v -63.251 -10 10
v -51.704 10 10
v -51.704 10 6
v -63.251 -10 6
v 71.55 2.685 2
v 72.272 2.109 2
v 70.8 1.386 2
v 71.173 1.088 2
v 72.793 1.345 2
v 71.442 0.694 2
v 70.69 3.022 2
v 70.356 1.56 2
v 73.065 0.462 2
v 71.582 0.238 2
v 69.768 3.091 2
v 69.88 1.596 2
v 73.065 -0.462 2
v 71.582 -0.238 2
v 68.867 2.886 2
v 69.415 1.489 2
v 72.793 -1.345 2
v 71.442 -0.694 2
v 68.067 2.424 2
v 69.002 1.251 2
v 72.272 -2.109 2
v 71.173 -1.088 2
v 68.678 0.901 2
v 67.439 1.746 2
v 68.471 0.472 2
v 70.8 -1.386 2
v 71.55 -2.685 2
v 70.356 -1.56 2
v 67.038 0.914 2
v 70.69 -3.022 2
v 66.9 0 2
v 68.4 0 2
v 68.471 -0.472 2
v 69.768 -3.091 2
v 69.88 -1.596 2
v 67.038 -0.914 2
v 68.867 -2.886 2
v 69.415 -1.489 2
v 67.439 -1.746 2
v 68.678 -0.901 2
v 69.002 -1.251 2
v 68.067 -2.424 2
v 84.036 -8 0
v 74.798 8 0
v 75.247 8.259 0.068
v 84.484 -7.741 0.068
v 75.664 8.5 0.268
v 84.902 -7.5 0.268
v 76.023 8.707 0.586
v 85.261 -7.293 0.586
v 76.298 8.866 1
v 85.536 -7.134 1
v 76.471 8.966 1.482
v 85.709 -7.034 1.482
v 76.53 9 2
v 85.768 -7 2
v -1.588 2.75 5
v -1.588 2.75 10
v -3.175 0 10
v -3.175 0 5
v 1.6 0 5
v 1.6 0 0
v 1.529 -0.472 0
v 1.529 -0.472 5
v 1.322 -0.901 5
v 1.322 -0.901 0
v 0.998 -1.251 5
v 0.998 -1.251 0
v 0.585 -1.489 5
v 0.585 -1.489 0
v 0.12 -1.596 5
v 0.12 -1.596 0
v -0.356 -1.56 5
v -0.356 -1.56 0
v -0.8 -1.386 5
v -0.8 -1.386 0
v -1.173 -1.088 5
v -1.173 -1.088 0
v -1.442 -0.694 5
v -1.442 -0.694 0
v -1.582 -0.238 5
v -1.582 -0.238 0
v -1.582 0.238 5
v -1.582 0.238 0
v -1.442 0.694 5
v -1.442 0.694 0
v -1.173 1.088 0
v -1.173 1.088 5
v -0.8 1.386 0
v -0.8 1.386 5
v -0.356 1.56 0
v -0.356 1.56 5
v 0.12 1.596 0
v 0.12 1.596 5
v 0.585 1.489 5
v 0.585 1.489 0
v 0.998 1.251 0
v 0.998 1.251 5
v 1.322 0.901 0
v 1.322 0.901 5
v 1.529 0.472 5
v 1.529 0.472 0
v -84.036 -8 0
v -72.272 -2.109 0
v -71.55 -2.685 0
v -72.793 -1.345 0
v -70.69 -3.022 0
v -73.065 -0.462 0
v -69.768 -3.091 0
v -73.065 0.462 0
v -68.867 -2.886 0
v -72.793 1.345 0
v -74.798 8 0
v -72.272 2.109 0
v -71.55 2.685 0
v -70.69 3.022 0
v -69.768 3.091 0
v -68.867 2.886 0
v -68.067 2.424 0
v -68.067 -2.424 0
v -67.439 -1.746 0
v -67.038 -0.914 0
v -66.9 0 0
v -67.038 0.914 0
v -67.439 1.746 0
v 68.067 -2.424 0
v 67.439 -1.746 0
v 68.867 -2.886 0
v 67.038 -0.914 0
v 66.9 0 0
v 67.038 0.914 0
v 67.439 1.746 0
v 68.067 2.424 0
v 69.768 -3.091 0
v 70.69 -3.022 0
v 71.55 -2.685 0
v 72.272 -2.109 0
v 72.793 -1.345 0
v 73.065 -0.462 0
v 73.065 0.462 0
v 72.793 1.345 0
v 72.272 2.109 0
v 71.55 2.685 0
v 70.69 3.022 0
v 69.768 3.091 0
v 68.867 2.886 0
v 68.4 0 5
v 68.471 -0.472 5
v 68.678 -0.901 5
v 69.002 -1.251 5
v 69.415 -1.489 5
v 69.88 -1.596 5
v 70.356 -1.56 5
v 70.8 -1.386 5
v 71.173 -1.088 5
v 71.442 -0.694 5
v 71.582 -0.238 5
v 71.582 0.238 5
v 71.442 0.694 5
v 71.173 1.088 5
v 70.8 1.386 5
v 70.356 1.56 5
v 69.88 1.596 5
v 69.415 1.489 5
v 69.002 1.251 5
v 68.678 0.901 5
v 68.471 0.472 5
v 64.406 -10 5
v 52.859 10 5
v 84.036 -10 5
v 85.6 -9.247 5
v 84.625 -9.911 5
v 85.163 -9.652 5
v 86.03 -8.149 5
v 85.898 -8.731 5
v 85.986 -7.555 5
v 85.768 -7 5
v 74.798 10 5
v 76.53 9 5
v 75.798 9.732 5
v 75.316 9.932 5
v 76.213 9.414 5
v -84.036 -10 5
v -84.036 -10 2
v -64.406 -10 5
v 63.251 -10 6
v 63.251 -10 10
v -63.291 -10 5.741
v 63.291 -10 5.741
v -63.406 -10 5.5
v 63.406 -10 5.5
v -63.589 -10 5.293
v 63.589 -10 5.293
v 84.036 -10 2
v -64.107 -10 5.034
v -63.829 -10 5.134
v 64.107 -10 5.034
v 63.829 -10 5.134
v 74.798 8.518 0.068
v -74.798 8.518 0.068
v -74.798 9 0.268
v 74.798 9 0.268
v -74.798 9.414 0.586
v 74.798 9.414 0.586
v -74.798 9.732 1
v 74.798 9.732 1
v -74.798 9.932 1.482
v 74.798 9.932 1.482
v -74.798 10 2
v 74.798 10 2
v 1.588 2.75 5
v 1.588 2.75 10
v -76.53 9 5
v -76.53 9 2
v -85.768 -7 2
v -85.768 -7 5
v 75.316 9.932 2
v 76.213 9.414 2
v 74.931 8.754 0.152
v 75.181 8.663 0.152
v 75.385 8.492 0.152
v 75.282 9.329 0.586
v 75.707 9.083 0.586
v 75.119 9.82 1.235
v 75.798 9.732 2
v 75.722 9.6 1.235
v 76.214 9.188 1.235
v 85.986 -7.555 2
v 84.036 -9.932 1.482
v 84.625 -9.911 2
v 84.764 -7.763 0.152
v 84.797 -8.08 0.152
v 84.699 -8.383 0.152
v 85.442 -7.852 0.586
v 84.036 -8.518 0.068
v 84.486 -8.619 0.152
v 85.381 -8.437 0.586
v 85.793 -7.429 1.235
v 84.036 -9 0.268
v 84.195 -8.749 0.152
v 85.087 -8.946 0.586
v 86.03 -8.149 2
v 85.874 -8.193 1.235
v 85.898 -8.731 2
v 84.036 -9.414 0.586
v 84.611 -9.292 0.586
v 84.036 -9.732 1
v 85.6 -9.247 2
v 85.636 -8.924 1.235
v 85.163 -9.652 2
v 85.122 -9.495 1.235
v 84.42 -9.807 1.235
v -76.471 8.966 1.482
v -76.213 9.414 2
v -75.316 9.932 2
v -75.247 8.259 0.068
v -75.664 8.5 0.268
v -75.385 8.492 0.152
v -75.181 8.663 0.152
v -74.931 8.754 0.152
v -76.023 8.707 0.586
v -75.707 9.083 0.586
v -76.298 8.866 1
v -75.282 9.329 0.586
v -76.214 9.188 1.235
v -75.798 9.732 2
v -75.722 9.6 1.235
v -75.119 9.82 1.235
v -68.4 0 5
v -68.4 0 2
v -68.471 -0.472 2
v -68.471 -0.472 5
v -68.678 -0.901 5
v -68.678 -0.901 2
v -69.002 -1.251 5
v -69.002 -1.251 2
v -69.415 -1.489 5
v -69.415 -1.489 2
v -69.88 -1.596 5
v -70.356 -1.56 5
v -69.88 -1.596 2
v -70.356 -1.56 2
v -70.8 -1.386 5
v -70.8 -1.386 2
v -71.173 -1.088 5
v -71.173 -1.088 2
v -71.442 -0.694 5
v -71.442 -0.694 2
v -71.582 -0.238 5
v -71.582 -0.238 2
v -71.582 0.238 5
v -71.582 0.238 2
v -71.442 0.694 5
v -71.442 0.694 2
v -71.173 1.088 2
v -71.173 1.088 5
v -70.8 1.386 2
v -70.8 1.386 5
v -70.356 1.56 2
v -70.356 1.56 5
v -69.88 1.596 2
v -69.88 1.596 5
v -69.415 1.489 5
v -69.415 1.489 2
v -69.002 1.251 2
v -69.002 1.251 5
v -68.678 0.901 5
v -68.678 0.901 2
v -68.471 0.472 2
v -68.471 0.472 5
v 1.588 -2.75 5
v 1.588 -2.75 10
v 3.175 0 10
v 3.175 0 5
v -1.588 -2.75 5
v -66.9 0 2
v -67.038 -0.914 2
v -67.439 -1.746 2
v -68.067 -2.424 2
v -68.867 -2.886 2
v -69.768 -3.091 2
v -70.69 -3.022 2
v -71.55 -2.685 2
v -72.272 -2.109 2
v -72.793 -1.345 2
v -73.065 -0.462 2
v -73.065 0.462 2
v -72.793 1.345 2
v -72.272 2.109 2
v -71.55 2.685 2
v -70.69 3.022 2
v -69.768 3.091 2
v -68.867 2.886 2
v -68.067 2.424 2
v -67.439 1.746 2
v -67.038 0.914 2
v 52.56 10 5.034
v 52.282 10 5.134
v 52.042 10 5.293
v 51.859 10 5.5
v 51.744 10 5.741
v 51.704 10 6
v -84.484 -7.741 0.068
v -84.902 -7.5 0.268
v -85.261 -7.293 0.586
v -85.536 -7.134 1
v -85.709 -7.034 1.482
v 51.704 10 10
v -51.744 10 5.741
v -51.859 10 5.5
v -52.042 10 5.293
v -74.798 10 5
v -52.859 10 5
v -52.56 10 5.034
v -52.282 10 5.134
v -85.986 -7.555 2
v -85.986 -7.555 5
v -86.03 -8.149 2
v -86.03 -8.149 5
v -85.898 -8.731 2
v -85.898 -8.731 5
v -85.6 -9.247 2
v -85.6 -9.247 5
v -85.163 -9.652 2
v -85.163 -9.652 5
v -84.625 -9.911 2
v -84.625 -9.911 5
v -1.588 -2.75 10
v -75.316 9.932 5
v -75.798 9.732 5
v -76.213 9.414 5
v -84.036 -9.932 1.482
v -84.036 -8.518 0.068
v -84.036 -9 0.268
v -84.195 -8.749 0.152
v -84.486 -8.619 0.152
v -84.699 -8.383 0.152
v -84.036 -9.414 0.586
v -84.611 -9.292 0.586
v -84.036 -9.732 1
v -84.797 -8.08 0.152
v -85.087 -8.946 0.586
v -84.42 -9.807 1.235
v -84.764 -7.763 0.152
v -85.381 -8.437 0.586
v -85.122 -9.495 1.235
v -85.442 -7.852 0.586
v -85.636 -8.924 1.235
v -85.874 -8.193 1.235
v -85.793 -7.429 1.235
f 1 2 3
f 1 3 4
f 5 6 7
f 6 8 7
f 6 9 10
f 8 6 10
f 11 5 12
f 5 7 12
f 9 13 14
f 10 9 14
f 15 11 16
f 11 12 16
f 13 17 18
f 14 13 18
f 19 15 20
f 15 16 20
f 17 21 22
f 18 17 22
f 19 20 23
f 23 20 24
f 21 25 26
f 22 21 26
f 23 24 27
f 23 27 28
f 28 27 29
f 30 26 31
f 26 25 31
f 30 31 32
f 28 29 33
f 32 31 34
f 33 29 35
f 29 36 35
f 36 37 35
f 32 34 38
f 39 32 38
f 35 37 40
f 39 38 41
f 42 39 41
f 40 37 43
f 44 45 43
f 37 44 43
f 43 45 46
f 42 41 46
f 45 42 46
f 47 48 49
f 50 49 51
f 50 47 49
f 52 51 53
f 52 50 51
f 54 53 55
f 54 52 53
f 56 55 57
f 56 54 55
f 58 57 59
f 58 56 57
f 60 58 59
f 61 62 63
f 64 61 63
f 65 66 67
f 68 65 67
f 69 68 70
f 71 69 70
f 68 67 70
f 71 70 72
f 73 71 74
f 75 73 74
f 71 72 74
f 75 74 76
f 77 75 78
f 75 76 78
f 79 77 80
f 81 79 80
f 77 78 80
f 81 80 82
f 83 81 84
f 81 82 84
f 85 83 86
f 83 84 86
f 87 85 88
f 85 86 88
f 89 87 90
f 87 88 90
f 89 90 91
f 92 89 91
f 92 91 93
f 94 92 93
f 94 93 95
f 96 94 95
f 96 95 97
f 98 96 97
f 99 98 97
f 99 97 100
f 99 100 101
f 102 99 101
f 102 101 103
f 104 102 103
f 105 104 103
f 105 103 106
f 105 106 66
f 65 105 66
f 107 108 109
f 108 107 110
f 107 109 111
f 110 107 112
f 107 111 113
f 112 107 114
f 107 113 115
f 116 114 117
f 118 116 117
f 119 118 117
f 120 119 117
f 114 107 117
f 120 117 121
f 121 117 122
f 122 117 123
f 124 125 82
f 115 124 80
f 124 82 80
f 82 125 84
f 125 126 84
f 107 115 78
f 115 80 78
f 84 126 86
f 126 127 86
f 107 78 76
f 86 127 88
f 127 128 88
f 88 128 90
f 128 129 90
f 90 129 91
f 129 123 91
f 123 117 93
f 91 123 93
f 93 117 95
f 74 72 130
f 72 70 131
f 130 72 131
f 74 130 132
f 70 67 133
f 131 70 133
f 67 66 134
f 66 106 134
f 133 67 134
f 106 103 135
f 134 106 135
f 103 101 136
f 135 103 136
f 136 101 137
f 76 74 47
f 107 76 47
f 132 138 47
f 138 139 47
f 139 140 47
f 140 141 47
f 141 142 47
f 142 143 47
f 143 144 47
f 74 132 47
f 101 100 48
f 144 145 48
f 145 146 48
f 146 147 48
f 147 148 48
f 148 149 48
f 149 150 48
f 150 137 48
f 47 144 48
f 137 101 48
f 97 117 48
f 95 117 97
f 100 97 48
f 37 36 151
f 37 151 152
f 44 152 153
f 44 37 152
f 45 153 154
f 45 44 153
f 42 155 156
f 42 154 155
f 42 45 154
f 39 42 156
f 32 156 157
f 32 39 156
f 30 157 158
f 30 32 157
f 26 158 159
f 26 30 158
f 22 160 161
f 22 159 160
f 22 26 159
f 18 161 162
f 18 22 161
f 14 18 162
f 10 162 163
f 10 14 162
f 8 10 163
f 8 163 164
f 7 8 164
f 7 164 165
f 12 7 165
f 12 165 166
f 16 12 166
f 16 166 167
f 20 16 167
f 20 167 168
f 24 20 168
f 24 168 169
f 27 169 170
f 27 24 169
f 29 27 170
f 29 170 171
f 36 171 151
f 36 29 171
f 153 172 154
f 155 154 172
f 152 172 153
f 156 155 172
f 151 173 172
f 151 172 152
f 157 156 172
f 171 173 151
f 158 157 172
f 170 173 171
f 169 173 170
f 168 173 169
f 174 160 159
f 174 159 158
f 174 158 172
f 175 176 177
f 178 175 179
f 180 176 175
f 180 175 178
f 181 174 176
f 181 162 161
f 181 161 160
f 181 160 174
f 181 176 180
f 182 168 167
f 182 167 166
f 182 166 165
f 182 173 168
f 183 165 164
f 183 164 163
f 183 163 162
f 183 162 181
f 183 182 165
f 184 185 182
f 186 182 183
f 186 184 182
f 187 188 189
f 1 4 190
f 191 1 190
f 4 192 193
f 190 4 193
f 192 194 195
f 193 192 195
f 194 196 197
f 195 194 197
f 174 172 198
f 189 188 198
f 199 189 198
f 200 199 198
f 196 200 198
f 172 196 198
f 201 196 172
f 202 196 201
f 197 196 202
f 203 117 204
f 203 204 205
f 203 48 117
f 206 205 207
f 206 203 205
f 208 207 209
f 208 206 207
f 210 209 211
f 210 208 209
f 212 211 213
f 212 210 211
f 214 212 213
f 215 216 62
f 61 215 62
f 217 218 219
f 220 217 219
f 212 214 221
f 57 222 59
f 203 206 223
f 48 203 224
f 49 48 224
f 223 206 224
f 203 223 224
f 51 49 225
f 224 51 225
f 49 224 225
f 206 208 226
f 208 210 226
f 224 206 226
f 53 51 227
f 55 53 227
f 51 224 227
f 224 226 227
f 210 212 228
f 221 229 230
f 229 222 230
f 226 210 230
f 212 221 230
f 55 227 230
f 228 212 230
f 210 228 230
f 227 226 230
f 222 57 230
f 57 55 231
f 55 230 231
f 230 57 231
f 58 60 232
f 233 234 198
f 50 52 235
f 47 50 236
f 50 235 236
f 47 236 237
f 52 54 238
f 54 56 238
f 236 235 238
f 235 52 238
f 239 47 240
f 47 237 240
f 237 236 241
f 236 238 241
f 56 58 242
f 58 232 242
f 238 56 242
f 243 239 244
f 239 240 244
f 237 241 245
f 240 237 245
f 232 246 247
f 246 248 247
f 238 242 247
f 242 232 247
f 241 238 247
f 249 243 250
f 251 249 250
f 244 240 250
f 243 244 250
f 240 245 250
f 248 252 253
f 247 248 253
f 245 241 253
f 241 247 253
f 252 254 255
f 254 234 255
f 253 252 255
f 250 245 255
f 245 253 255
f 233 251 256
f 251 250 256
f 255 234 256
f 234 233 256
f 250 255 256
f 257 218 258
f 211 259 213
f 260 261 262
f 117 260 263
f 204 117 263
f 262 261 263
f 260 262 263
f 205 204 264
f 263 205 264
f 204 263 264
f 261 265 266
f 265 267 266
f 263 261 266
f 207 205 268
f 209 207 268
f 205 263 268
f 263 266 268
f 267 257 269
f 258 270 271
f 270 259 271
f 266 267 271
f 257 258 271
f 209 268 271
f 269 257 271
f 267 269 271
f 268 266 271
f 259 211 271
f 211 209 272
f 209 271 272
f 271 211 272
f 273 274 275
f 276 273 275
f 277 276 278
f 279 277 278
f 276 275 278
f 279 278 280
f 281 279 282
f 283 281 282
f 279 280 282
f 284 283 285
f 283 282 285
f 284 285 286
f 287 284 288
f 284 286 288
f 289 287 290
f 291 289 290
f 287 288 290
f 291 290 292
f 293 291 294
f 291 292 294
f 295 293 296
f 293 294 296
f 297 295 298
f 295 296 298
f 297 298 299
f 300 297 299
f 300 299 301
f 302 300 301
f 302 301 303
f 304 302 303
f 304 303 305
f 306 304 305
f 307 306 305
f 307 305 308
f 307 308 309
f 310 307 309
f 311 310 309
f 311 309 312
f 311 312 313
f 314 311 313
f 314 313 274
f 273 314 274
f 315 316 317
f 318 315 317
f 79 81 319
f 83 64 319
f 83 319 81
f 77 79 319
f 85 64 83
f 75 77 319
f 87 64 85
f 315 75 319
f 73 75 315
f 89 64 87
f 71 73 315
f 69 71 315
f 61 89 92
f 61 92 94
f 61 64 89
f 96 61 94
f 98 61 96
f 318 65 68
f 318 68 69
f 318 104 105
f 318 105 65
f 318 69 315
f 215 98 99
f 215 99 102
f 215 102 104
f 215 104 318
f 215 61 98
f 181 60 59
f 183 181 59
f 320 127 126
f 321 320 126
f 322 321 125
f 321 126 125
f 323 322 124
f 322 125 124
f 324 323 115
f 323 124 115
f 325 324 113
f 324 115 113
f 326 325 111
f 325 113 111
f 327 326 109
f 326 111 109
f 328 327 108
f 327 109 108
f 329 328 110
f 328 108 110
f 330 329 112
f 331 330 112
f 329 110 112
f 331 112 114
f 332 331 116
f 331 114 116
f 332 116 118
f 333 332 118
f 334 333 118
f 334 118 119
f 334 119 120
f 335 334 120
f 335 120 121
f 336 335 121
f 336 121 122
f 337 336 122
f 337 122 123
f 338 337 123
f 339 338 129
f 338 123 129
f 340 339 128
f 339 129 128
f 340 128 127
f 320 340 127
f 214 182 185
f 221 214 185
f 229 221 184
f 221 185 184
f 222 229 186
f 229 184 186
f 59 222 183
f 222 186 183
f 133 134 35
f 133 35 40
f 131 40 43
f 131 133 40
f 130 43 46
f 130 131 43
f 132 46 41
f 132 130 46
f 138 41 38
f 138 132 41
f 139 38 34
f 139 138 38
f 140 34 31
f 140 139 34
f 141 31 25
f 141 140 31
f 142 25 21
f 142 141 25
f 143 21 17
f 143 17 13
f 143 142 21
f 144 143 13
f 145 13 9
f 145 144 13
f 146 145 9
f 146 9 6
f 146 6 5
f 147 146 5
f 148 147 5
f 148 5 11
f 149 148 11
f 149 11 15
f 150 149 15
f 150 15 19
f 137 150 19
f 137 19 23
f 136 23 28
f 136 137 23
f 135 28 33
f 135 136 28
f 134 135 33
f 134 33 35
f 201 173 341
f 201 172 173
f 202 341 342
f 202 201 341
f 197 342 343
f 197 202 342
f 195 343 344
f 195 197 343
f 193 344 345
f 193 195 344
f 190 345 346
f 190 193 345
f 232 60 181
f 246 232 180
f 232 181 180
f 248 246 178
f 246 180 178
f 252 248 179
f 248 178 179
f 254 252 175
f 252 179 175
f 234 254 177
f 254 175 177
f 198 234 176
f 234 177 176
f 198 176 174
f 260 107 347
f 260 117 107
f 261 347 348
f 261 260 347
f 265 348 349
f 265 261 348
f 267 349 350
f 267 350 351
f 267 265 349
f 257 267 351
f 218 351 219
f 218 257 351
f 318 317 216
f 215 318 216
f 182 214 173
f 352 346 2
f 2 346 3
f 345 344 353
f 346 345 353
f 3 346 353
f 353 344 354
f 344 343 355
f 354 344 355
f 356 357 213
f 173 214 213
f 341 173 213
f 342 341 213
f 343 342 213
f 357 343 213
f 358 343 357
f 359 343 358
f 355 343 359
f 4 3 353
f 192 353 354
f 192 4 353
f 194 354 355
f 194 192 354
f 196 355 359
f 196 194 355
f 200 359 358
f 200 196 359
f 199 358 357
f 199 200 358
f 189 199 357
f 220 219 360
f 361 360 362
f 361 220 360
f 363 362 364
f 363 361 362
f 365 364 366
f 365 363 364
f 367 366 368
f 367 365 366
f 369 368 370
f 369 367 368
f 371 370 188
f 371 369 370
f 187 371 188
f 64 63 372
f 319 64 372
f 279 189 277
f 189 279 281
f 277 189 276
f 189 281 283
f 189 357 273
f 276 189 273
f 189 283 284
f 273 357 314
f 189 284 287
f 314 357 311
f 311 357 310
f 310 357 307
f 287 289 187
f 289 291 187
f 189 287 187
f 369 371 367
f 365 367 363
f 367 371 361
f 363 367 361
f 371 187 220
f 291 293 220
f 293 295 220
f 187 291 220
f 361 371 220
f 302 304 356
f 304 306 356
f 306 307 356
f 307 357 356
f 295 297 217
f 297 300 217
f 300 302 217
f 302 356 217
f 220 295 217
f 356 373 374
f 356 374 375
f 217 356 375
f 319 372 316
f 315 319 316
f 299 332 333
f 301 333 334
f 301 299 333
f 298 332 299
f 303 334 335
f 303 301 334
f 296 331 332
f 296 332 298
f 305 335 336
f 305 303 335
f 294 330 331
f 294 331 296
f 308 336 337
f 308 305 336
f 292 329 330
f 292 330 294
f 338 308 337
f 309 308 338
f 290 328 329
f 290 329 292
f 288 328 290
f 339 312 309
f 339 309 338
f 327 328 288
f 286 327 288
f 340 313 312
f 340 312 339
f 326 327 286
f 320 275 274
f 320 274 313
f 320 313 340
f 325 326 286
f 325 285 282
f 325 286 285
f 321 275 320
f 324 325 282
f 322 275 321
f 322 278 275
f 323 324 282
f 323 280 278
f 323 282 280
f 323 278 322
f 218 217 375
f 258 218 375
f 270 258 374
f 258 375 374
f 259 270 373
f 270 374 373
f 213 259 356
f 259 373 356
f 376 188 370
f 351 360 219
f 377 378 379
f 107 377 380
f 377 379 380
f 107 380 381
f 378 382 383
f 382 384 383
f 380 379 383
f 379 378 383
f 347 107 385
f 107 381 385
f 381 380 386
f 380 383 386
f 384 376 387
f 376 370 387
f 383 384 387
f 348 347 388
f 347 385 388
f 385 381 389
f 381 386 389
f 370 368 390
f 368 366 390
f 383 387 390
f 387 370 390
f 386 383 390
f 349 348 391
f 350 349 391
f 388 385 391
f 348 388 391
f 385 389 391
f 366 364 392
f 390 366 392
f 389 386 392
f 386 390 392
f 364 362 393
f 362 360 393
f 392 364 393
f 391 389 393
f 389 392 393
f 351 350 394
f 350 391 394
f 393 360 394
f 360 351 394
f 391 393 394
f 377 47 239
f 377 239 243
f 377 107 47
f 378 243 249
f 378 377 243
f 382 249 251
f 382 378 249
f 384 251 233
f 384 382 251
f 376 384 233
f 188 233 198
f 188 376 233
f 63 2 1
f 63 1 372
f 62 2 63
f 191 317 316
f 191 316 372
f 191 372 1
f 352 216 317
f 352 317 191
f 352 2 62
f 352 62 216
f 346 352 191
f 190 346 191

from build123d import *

# Parameters (mm, degrees)
PAD_DEPTH       = 10
POCKET_DEPTH    = 5
SKETCH002_R     = 1.6
POCKET001_DEPTH = 10.001
SKETCH003_R     = 1.6
POCKET002_DEPTH = 362.846575
POCKET003_DEPTH = 5
SKETCH005_R     = 3.1
POCKET004_DEPTH = 2
FILLET_R        = 2
FILLET001_R     = 2
FILLET002_R     = 2
FILLET003_R     = 2
FILLET004_R     = 2
FILLET005_R     = 1
FILLET006_R     = 1


with BuildPart() as part:
    # Sketch → Pad (new body)
    with BuildSketch(Plane.XY):
        Polygon((-75.952995, 10), (-87.5, -10), (87.5, -10), (75.952995, 10), align=None)
    extrude(amount=PAD_DEPTH)

    # Sketch001 → Pocket (cut)
    with BuildSketch(Plane.XY.offset(10)):
        Polygon((-75.952995, 10), (-51.704283, 10), (-63.251289, -10), (-87.5, -10), align=None)
    pocket = extrude(amount=-POCKET_DEPTH, mode=Mode.SUBTRACT)

    # Mirrored: Pocket across Sketch001 V_Axis
    add(pocket.mirror(Plane(origin=(0, 0, 10), x_dir=(0, 0, 1), z_dir=(1, 0, 0))), mode=Mode.SUBTRACT)

    # Sketch002 → Pocket001 (cut, through all)
    with BuildSketch(Plane(origin=(0, 0, 0), x_dir=(1, 0, 0), z_dir=(0, 0, -1))):
        Circle(SKETCH002_R)
    extrude(amount=-POCKET001_DEPTH, mode=Mode.SUBTRACT)

    # Sketch003 → Pocket002 (cut, through all)
    with BuildSketch(Plane(origin=(0, 0, 0), x_dir=(1, 0, 0), z_dir=(0, 0, -1))):
        with Locations((-70, 0)):
            Circle(SKETCH003_R)
    pocket002 = extrude(amount=-POCKET002_DEPTH, mode=Mode.SUBTRACT)

    # Mirrored001: Pocket002 across Sketch003 V_Axis
    add(pocket002.mirror(Plane(origin=(0, 0, 0), x_dir=(0, 0, -1), z_dir=(1, 0, 0))), mode=Mode.SUBTRACT)

    # Sketch004 → Pocket003 (cut)
    with BuildSketch(Plane.XY.offset(10)):
        Polygon((3.175426, 0), (1.587713, 2.75), (-1.587713, 2.75), (-3.175426, 0), (-1.587713, -2.75), (1.587713, -2.75), align=None)
    extrude(amount=-POCKET003_DEPTH, mode=Mode.SUBTRACT)

    # Sketch005 → Pocket004 (cut)
    with BuildSketch(Plane(origin=(0, 0, 0), x_dir=(1, 0, 0), z_dir=(0, 0, -1))):
        with Locations((-70, 0)):
            Circle(SKETCH005_R)
    pocket004 = extrude(amount=-POCKET004_DEPTH, mode=Mode.SUBTRACT)

    # Mirrored002: Pocket004 across Sketch005 V_Axis
    add(pocket004.mirror(Plane(origin=(0, 0, 0), x_dir=(0, 0, -1), z_dir=(1, 0, 0))), mode=Mode.SUBTRACT)

    # Fillet
    fillet_edges = [part.edges().sort_by_distance(p)[0] for p in [
        (-75.952995, 10, 2.5),
    ]]
    fillet(fillet_edges, radius=FILLET_R)

    # Fillet001
    fillet001_edges = [part.edges().sort_by_distance(p)[0] for p in [
        (-87.5, -10, 2.5),
    ]]
    fillet(fillet001_edges, radius=FILLET001_R)

    # Fillet002
    fillet002_edges = [part.edges().sort_by_distance(p)[0] for p in [
        (75.952995, 10, 2.5),
    ]]
    fillet(fillet002_edges, radius=FILLET002_R)

    # Fillet003
    fillet003_edges = [part.edges().sort_by_distance(p)[0] for p in [
        (87.5, -10, 2.5),
    ]]
    fillet(fillet003_edges, radius=FILLET003_R)

    # Fillet004
    fillet004_edges = [part.edges().sort_by_distance(p)[0] for p in [
        (-75.798294, 9.732051, 0),
    ]]
    fillet(fillet004_edges, radius=FILLET004_R)

    # Fillet005
    fillet005_edges = [part.edges().sort_by_distance(p)[0] for p in [
        (57.477786, 0, 5),
    ]]
    fillet(fillet005_edges, radius=FILLET005_R)

    # Fillet006
    fillet006_edges = [part.edges().sort_by_distance(p)[0] for p in [
        (-57.477786, 0, 5),
    ]]
    fillet(fillet006_edges, radius=FILLET006_R)


solid = part.part
